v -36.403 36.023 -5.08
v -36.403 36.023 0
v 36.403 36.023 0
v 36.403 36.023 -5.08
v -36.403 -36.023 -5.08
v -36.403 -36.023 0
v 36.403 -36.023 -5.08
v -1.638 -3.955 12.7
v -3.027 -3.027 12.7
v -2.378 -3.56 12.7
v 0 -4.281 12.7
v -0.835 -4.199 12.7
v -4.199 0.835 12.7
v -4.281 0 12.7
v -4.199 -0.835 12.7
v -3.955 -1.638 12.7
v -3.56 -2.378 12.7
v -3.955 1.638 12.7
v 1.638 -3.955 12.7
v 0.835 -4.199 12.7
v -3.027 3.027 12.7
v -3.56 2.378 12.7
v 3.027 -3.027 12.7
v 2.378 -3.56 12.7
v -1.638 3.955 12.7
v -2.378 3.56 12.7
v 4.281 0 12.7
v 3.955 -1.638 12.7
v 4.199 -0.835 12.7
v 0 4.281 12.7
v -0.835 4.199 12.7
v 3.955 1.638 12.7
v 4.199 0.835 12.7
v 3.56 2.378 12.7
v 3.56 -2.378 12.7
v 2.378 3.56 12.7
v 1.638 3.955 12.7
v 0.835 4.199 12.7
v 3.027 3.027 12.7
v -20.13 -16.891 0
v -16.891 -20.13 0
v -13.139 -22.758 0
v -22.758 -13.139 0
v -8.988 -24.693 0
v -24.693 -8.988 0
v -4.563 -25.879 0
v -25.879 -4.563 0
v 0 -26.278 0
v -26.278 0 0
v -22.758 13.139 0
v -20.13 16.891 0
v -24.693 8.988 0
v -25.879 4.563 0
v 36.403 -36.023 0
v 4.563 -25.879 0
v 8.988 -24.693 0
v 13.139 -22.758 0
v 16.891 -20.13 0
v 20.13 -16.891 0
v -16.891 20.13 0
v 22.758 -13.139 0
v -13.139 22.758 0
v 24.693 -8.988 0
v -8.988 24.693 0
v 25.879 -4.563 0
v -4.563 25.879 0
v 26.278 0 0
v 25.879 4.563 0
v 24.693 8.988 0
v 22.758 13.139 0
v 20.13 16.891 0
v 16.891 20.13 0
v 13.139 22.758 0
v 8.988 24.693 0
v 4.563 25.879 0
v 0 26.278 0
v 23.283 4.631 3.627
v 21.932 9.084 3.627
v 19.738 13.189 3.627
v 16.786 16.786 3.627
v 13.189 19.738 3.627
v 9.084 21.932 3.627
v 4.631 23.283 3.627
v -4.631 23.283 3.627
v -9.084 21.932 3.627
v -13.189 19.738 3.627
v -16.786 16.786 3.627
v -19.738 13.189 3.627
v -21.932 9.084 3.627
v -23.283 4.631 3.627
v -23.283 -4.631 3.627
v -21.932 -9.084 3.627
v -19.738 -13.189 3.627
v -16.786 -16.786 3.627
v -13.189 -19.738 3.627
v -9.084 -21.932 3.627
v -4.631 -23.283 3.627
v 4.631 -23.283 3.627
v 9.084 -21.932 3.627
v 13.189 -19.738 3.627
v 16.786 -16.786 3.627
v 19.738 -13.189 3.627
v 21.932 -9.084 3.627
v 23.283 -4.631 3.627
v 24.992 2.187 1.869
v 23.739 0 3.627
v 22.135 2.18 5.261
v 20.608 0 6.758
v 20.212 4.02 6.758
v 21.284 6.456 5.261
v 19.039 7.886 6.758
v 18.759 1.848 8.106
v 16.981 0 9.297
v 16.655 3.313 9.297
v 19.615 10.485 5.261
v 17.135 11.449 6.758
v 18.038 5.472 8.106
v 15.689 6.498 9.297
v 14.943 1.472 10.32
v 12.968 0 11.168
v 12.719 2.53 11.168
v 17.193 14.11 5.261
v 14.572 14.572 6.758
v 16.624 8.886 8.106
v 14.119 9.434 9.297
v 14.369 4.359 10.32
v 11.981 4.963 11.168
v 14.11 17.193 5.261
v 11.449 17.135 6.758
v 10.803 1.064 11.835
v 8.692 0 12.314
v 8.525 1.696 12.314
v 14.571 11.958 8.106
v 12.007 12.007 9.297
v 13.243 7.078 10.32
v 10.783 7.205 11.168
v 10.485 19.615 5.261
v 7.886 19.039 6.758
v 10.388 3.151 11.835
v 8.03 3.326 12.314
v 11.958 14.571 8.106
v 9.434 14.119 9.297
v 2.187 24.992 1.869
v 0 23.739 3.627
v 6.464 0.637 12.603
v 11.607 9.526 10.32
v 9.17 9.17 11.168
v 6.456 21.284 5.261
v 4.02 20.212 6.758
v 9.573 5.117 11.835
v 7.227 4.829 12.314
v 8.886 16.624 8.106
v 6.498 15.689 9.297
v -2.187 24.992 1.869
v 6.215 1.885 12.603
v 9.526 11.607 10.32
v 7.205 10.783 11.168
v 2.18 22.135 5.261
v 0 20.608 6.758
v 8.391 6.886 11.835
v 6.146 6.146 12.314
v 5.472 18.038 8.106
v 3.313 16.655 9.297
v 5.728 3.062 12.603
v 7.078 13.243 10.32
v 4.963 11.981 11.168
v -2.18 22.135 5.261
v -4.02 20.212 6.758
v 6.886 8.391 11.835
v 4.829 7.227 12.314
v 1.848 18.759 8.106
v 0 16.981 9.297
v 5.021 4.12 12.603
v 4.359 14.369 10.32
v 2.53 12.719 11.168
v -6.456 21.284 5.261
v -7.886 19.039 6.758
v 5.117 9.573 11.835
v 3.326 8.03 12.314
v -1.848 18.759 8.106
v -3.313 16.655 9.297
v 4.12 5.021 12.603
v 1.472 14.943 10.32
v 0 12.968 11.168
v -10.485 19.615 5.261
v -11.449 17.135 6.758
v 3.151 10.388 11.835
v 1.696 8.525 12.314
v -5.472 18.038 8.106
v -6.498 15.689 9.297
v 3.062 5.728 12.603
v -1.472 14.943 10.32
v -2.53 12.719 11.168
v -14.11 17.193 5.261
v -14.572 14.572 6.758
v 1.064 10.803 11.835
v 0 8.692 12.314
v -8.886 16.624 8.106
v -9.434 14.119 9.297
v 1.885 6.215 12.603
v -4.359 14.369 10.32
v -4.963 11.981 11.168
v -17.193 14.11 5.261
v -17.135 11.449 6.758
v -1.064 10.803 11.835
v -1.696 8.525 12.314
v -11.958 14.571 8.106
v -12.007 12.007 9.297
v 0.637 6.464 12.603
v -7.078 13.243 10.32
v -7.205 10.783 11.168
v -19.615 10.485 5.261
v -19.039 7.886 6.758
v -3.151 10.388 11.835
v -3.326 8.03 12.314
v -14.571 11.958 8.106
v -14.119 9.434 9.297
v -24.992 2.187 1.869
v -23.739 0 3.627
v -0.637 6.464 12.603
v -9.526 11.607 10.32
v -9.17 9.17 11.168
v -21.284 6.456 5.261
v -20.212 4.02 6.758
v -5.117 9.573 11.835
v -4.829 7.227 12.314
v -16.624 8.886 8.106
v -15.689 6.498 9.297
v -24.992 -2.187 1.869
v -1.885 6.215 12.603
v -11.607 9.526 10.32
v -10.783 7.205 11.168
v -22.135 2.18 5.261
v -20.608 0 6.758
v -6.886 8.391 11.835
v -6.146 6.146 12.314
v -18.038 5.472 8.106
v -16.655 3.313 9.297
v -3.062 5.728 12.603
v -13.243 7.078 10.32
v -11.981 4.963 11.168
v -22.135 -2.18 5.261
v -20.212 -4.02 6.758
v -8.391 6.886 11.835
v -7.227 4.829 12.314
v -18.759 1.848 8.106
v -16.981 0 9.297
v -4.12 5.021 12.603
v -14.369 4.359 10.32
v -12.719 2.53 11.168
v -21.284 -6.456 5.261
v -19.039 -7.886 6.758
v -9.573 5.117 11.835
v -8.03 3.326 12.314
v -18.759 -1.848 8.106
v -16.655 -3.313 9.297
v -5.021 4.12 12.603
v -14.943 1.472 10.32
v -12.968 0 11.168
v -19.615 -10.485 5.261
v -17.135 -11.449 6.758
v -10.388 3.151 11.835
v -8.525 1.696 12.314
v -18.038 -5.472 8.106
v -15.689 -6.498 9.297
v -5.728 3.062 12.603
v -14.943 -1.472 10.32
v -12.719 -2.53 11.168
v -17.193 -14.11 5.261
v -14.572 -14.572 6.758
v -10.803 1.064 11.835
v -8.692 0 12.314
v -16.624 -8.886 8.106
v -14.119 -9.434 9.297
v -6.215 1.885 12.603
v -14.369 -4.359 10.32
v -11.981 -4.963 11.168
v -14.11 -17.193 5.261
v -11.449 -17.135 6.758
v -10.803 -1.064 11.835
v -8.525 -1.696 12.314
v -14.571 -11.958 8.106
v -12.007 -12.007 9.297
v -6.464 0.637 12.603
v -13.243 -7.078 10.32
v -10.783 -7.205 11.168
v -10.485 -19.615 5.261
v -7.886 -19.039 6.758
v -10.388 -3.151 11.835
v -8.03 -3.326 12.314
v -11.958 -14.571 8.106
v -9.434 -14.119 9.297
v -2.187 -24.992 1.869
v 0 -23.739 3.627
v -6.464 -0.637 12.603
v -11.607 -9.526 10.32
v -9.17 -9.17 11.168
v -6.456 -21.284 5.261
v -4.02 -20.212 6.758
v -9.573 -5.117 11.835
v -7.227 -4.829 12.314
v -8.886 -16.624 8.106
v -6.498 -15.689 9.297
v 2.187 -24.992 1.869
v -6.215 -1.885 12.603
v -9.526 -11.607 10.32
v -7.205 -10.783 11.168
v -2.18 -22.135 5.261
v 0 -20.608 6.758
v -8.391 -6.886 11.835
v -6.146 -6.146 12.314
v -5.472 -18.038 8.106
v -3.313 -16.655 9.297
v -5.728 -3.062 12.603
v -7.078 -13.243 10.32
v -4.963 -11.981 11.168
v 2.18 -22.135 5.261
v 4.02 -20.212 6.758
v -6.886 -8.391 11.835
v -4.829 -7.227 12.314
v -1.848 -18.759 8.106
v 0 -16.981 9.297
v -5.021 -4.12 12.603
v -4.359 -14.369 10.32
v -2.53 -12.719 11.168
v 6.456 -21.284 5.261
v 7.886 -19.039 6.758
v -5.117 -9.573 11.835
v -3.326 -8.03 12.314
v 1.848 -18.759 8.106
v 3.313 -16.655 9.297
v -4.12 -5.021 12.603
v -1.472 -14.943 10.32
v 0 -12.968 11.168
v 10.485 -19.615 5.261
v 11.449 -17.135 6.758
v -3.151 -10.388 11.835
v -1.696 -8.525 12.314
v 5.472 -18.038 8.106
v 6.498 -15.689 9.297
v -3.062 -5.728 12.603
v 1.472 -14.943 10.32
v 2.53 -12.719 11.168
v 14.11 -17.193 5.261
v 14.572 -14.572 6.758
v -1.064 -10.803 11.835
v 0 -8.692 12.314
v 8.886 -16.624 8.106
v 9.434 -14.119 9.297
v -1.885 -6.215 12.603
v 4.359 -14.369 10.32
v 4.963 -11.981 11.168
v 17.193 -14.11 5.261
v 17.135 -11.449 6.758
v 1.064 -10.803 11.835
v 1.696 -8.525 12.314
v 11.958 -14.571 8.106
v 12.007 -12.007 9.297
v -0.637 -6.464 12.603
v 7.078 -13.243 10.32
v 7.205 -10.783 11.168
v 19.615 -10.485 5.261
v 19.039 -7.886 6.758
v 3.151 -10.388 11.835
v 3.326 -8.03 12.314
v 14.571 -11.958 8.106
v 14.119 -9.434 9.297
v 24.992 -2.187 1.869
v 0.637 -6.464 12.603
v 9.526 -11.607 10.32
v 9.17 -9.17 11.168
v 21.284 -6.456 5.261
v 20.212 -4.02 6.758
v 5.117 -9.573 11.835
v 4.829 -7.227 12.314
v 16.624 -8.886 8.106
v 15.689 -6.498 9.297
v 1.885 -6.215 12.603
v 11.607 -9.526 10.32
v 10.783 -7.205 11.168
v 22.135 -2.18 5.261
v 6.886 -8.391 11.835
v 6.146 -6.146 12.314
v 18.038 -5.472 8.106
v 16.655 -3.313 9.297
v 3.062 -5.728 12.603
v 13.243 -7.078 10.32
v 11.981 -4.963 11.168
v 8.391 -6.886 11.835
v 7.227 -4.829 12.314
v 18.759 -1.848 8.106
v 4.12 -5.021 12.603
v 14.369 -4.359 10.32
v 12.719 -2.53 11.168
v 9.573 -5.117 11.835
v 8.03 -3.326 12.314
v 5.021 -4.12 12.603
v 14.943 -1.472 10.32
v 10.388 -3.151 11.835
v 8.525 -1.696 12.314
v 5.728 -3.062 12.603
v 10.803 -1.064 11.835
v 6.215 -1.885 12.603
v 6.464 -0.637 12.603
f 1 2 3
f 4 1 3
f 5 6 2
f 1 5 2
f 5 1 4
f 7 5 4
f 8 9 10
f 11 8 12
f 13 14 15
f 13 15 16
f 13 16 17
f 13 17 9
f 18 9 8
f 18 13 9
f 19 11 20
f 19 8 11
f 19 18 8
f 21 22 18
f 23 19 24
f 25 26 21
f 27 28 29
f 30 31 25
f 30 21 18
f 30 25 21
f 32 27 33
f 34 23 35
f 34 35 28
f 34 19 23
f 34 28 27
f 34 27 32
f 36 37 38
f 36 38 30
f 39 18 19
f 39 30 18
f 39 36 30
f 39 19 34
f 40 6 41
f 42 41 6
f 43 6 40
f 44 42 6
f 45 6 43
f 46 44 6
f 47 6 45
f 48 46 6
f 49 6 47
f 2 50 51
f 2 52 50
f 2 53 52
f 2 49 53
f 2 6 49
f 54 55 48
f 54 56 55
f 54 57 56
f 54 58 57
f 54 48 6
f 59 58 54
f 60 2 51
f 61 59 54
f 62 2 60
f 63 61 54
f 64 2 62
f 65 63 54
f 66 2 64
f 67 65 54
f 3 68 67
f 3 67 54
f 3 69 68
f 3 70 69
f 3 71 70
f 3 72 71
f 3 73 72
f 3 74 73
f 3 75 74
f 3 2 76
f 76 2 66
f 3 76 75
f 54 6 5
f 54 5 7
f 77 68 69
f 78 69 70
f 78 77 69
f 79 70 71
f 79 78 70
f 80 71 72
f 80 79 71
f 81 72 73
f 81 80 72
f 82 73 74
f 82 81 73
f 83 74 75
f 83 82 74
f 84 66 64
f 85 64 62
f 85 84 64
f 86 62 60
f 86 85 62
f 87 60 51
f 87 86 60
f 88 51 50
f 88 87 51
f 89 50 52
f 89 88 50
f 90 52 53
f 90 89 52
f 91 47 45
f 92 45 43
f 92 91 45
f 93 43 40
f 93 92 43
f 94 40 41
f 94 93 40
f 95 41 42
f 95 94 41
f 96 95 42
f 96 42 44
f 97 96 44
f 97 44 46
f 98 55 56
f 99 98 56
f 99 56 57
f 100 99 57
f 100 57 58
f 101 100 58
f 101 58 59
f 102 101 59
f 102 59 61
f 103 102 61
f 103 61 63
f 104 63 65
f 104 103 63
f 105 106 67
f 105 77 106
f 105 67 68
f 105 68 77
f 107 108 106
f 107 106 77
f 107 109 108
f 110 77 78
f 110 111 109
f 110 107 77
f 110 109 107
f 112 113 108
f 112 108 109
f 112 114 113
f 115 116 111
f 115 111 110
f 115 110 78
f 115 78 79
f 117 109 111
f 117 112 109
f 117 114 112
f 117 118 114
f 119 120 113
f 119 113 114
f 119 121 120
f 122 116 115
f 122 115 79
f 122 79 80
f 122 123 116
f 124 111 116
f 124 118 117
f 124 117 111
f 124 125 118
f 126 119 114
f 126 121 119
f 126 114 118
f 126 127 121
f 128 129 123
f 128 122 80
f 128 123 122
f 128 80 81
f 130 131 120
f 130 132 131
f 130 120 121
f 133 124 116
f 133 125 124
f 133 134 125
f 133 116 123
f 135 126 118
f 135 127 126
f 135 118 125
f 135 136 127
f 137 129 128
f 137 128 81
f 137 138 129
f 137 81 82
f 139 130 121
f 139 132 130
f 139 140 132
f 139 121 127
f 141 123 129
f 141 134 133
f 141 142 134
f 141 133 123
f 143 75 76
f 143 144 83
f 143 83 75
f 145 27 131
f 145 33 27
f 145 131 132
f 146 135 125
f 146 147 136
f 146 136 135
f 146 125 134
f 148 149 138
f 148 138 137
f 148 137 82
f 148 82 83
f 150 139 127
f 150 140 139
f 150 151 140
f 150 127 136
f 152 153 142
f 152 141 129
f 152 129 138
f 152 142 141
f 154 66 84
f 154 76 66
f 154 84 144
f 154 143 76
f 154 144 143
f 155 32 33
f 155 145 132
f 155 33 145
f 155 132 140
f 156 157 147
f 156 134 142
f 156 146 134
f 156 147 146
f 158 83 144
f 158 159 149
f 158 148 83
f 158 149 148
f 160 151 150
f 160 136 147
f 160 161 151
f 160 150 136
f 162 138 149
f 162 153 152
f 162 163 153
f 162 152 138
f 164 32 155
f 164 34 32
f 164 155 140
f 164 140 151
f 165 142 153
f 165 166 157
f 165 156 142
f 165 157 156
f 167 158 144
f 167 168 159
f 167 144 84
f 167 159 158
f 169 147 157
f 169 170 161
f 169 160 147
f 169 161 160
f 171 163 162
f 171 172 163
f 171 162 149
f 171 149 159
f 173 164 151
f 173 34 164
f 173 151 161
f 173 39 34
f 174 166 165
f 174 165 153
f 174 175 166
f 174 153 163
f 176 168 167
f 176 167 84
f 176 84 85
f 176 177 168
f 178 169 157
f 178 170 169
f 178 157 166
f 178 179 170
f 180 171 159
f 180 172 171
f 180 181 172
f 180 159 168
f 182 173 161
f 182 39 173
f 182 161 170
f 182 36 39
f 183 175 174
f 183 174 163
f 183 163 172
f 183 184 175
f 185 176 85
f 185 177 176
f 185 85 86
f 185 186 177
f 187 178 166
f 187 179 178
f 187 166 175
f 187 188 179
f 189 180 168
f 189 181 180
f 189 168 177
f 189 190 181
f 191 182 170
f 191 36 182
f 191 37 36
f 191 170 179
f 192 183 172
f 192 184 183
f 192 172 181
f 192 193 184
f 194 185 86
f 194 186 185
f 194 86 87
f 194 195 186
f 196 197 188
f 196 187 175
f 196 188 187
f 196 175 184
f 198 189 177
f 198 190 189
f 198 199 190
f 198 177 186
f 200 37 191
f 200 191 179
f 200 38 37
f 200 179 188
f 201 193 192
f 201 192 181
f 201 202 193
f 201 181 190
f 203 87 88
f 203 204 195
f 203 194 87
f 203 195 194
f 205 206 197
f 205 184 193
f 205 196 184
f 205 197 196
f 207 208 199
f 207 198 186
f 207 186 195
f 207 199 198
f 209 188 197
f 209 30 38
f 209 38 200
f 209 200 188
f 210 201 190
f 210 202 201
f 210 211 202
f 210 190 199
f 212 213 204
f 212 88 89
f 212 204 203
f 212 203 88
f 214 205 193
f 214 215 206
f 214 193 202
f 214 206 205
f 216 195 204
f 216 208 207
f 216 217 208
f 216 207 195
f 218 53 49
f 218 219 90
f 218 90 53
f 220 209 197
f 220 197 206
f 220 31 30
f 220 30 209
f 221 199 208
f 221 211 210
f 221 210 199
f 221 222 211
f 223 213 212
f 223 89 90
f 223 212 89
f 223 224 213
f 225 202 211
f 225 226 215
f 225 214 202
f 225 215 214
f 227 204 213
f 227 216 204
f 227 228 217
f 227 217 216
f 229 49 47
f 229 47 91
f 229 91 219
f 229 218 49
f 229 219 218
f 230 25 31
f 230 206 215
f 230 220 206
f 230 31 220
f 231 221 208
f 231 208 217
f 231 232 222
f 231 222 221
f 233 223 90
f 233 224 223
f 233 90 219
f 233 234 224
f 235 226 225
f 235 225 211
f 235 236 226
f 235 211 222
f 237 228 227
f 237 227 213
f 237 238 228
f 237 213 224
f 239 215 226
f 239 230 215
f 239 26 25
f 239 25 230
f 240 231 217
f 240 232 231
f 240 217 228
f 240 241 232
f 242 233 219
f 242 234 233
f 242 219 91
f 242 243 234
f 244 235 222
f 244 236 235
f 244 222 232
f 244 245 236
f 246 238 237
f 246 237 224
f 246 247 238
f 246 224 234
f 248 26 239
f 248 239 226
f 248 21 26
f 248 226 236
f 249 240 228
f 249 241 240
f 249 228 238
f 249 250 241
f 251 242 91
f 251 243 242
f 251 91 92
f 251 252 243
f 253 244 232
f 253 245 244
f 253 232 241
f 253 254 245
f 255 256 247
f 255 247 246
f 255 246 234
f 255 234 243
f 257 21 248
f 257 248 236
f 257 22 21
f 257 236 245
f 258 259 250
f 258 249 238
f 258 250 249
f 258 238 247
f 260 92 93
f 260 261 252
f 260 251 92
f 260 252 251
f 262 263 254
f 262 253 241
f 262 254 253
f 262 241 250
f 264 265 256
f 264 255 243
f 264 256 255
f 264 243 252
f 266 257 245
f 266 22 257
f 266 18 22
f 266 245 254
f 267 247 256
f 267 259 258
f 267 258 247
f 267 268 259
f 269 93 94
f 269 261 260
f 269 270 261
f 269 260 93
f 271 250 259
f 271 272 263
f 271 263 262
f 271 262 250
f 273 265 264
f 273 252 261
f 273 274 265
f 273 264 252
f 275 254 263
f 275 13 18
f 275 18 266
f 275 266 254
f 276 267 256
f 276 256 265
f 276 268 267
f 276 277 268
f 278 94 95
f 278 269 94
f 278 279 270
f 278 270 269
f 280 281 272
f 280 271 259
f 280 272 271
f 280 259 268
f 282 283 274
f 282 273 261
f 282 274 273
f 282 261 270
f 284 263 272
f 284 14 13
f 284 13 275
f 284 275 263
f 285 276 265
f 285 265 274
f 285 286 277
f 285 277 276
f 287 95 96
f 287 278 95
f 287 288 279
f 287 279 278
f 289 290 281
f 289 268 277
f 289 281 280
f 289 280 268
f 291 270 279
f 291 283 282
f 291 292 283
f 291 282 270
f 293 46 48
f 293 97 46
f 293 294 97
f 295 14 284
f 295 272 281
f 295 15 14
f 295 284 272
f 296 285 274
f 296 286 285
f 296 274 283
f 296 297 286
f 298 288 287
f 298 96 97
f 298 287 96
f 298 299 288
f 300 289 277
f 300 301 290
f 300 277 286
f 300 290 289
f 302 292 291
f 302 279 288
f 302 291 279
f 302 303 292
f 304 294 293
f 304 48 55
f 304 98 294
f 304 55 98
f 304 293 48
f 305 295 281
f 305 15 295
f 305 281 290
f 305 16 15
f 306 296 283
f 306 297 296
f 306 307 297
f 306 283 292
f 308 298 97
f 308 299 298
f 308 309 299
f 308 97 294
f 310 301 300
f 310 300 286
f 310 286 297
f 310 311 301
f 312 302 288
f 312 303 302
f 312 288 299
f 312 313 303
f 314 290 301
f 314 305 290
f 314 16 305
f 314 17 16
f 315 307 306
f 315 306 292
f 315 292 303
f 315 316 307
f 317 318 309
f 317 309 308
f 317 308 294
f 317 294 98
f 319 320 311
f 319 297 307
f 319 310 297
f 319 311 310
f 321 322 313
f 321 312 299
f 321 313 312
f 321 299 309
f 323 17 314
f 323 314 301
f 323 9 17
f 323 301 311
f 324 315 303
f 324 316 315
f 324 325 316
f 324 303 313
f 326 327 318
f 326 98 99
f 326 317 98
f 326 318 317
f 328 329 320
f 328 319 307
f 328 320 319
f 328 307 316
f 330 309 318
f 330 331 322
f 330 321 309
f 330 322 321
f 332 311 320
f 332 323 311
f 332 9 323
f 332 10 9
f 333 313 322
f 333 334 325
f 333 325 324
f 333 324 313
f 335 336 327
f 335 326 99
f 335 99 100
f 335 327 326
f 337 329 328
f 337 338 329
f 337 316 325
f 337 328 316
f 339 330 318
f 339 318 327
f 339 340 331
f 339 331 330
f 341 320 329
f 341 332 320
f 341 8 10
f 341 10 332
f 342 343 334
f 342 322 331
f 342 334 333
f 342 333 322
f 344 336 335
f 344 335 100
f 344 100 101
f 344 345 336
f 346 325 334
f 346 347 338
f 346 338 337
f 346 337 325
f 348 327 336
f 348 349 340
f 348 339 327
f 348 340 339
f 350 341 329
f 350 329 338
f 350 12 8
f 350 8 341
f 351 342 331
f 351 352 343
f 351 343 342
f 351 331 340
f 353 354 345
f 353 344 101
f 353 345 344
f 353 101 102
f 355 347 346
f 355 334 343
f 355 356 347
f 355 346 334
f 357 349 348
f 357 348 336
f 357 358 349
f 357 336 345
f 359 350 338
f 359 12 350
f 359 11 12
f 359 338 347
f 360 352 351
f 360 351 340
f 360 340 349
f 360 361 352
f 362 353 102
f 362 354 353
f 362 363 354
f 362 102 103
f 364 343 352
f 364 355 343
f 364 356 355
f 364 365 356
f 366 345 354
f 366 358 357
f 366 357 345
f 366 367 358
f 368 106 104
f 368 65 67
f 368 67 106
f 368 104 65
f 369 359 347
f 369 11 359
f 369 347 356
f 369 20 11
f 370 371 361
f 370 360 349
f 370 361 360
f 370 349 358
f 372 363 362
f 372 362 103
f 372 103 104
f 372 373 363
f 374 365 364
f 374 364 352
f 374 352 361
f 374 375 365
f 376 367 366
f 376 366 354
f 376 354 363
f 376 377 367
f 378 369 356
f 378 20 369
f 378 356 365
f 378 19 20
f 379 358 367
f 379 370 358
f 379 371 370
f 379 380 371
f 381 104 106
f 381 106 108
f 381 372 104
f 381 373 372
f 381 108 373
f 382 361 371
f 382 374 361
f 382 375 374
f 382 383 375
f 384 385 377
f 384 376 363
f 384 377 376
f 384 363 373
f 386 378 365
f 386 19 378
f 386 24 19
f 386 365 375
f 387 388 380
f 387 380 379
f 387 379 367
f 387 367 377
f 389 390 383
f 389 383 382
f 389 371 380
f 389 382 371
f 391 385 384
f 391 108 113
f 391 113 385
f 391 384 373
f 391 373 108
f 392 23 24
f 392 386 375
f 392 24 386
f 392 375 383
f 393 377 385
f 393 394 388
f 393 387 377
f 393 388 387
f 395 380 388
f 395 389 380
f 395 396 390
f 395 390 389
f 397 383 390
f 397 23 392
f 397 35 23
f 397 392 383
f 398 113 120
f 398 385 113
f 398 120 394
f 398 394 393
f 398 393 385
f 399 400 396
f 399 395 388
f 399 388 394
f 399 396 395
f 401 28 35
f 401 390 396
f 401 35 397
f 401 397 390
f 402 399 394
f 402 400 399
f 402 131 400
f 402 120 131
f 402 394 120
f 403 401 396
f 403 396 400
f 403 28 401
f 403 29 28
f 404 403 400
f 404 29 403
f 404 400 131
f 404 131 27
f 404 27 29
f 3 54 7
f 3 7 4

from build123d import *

# Parameters (mm, degrees)
F0_R     = 26.2781927152
F1_DEPTH = 12.7
F3_W     = 72.8053152561
F3_H     = 72.0469206572
F4_DEPTH = 5.08


# Not quite as in the source:
# - a fillet or chamfer that OpenCascade refuses, or shapes differently, is made with other operations: its cross-section is extruded or revolved along the edge and cut away or added


with BuildPart() as f1:
    # F0 (on Top) → F1 (new body)
    with BuildSketch(Plane.XY):
        Circle(F0_R)
    extrude(amount=F1_DEPTH)

    # F2: fillet of radius 25.4 on 1 edges, made by hand

    # F2_s1 → F2_t2 (revolve, cut)
    with BuildSketch(Plane.XZ):
        with BuildLine():
            ThreePointArc((26.2781927152, 0), (16.9811474591, 9.2970452561), (4.2811474591, 12.7))
            Line((4.2811474591, 12.7), (26.2781927152, 12.7))
            Line((26.2781927152, 12.7), (26.2781927152, 0))
        make_face()
    revolve(axis=Axis((0, 0, 12.7), (0, 0, 1)), mode=Mode.SUBTRACT)

    # F3 (on Top) → F4 (join)
    with BuildSketch(Plane.XY):
        Rectangle(F3_W, F3_H)
    extrude(amount=-F4_DEPTH)


solid = f1.part
